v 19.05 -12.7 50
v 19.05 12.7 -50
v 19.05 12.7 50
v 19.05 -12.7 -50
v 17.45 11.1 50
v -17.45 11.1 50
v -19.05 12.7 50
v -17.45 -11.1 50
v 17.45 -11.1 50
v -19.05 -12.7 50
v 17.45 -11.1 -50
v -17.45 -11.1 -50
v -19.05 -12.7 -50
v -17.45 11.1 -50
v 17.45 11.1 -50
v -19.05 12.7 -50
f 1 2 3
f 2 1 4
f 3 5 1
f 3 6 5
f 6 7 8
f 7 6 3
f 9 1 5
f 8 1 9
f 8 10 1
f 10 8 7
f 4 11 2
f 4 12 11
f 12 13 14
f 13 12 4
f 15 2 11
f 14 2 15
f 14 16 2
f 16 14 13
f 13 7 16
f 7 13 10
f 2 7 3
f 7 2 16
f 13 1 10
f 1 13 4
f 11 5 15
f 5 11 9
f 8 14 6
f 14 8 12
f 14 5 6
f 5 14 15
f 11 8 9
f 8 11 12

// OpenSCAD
module rectangular_tube(length, outer_w=38.1, outer_h=25.4, wall=1.6) {
    eps = 0.05; // small overlap to ensure open ends and avoid coplanar faces

    inner_w = outer_w - 2*wall;
    inner_h = outer_h - 2*wall;

    assert(length > 0, "Length must be > 0.");
    assert(inner_w > 0 && inner_h > 0, "Wall thickness too large for given outer dimensions.");

    difference() {
        // Outer box section
        cube([outer_w, outer_h, length], center=true);

        // Inner void: extend beyond both ends so there are no end caps
        cube([inner_w, inner_h, length + 2*eps], center=true);
    }
}

// Example usage
rectangular_tube(100);
